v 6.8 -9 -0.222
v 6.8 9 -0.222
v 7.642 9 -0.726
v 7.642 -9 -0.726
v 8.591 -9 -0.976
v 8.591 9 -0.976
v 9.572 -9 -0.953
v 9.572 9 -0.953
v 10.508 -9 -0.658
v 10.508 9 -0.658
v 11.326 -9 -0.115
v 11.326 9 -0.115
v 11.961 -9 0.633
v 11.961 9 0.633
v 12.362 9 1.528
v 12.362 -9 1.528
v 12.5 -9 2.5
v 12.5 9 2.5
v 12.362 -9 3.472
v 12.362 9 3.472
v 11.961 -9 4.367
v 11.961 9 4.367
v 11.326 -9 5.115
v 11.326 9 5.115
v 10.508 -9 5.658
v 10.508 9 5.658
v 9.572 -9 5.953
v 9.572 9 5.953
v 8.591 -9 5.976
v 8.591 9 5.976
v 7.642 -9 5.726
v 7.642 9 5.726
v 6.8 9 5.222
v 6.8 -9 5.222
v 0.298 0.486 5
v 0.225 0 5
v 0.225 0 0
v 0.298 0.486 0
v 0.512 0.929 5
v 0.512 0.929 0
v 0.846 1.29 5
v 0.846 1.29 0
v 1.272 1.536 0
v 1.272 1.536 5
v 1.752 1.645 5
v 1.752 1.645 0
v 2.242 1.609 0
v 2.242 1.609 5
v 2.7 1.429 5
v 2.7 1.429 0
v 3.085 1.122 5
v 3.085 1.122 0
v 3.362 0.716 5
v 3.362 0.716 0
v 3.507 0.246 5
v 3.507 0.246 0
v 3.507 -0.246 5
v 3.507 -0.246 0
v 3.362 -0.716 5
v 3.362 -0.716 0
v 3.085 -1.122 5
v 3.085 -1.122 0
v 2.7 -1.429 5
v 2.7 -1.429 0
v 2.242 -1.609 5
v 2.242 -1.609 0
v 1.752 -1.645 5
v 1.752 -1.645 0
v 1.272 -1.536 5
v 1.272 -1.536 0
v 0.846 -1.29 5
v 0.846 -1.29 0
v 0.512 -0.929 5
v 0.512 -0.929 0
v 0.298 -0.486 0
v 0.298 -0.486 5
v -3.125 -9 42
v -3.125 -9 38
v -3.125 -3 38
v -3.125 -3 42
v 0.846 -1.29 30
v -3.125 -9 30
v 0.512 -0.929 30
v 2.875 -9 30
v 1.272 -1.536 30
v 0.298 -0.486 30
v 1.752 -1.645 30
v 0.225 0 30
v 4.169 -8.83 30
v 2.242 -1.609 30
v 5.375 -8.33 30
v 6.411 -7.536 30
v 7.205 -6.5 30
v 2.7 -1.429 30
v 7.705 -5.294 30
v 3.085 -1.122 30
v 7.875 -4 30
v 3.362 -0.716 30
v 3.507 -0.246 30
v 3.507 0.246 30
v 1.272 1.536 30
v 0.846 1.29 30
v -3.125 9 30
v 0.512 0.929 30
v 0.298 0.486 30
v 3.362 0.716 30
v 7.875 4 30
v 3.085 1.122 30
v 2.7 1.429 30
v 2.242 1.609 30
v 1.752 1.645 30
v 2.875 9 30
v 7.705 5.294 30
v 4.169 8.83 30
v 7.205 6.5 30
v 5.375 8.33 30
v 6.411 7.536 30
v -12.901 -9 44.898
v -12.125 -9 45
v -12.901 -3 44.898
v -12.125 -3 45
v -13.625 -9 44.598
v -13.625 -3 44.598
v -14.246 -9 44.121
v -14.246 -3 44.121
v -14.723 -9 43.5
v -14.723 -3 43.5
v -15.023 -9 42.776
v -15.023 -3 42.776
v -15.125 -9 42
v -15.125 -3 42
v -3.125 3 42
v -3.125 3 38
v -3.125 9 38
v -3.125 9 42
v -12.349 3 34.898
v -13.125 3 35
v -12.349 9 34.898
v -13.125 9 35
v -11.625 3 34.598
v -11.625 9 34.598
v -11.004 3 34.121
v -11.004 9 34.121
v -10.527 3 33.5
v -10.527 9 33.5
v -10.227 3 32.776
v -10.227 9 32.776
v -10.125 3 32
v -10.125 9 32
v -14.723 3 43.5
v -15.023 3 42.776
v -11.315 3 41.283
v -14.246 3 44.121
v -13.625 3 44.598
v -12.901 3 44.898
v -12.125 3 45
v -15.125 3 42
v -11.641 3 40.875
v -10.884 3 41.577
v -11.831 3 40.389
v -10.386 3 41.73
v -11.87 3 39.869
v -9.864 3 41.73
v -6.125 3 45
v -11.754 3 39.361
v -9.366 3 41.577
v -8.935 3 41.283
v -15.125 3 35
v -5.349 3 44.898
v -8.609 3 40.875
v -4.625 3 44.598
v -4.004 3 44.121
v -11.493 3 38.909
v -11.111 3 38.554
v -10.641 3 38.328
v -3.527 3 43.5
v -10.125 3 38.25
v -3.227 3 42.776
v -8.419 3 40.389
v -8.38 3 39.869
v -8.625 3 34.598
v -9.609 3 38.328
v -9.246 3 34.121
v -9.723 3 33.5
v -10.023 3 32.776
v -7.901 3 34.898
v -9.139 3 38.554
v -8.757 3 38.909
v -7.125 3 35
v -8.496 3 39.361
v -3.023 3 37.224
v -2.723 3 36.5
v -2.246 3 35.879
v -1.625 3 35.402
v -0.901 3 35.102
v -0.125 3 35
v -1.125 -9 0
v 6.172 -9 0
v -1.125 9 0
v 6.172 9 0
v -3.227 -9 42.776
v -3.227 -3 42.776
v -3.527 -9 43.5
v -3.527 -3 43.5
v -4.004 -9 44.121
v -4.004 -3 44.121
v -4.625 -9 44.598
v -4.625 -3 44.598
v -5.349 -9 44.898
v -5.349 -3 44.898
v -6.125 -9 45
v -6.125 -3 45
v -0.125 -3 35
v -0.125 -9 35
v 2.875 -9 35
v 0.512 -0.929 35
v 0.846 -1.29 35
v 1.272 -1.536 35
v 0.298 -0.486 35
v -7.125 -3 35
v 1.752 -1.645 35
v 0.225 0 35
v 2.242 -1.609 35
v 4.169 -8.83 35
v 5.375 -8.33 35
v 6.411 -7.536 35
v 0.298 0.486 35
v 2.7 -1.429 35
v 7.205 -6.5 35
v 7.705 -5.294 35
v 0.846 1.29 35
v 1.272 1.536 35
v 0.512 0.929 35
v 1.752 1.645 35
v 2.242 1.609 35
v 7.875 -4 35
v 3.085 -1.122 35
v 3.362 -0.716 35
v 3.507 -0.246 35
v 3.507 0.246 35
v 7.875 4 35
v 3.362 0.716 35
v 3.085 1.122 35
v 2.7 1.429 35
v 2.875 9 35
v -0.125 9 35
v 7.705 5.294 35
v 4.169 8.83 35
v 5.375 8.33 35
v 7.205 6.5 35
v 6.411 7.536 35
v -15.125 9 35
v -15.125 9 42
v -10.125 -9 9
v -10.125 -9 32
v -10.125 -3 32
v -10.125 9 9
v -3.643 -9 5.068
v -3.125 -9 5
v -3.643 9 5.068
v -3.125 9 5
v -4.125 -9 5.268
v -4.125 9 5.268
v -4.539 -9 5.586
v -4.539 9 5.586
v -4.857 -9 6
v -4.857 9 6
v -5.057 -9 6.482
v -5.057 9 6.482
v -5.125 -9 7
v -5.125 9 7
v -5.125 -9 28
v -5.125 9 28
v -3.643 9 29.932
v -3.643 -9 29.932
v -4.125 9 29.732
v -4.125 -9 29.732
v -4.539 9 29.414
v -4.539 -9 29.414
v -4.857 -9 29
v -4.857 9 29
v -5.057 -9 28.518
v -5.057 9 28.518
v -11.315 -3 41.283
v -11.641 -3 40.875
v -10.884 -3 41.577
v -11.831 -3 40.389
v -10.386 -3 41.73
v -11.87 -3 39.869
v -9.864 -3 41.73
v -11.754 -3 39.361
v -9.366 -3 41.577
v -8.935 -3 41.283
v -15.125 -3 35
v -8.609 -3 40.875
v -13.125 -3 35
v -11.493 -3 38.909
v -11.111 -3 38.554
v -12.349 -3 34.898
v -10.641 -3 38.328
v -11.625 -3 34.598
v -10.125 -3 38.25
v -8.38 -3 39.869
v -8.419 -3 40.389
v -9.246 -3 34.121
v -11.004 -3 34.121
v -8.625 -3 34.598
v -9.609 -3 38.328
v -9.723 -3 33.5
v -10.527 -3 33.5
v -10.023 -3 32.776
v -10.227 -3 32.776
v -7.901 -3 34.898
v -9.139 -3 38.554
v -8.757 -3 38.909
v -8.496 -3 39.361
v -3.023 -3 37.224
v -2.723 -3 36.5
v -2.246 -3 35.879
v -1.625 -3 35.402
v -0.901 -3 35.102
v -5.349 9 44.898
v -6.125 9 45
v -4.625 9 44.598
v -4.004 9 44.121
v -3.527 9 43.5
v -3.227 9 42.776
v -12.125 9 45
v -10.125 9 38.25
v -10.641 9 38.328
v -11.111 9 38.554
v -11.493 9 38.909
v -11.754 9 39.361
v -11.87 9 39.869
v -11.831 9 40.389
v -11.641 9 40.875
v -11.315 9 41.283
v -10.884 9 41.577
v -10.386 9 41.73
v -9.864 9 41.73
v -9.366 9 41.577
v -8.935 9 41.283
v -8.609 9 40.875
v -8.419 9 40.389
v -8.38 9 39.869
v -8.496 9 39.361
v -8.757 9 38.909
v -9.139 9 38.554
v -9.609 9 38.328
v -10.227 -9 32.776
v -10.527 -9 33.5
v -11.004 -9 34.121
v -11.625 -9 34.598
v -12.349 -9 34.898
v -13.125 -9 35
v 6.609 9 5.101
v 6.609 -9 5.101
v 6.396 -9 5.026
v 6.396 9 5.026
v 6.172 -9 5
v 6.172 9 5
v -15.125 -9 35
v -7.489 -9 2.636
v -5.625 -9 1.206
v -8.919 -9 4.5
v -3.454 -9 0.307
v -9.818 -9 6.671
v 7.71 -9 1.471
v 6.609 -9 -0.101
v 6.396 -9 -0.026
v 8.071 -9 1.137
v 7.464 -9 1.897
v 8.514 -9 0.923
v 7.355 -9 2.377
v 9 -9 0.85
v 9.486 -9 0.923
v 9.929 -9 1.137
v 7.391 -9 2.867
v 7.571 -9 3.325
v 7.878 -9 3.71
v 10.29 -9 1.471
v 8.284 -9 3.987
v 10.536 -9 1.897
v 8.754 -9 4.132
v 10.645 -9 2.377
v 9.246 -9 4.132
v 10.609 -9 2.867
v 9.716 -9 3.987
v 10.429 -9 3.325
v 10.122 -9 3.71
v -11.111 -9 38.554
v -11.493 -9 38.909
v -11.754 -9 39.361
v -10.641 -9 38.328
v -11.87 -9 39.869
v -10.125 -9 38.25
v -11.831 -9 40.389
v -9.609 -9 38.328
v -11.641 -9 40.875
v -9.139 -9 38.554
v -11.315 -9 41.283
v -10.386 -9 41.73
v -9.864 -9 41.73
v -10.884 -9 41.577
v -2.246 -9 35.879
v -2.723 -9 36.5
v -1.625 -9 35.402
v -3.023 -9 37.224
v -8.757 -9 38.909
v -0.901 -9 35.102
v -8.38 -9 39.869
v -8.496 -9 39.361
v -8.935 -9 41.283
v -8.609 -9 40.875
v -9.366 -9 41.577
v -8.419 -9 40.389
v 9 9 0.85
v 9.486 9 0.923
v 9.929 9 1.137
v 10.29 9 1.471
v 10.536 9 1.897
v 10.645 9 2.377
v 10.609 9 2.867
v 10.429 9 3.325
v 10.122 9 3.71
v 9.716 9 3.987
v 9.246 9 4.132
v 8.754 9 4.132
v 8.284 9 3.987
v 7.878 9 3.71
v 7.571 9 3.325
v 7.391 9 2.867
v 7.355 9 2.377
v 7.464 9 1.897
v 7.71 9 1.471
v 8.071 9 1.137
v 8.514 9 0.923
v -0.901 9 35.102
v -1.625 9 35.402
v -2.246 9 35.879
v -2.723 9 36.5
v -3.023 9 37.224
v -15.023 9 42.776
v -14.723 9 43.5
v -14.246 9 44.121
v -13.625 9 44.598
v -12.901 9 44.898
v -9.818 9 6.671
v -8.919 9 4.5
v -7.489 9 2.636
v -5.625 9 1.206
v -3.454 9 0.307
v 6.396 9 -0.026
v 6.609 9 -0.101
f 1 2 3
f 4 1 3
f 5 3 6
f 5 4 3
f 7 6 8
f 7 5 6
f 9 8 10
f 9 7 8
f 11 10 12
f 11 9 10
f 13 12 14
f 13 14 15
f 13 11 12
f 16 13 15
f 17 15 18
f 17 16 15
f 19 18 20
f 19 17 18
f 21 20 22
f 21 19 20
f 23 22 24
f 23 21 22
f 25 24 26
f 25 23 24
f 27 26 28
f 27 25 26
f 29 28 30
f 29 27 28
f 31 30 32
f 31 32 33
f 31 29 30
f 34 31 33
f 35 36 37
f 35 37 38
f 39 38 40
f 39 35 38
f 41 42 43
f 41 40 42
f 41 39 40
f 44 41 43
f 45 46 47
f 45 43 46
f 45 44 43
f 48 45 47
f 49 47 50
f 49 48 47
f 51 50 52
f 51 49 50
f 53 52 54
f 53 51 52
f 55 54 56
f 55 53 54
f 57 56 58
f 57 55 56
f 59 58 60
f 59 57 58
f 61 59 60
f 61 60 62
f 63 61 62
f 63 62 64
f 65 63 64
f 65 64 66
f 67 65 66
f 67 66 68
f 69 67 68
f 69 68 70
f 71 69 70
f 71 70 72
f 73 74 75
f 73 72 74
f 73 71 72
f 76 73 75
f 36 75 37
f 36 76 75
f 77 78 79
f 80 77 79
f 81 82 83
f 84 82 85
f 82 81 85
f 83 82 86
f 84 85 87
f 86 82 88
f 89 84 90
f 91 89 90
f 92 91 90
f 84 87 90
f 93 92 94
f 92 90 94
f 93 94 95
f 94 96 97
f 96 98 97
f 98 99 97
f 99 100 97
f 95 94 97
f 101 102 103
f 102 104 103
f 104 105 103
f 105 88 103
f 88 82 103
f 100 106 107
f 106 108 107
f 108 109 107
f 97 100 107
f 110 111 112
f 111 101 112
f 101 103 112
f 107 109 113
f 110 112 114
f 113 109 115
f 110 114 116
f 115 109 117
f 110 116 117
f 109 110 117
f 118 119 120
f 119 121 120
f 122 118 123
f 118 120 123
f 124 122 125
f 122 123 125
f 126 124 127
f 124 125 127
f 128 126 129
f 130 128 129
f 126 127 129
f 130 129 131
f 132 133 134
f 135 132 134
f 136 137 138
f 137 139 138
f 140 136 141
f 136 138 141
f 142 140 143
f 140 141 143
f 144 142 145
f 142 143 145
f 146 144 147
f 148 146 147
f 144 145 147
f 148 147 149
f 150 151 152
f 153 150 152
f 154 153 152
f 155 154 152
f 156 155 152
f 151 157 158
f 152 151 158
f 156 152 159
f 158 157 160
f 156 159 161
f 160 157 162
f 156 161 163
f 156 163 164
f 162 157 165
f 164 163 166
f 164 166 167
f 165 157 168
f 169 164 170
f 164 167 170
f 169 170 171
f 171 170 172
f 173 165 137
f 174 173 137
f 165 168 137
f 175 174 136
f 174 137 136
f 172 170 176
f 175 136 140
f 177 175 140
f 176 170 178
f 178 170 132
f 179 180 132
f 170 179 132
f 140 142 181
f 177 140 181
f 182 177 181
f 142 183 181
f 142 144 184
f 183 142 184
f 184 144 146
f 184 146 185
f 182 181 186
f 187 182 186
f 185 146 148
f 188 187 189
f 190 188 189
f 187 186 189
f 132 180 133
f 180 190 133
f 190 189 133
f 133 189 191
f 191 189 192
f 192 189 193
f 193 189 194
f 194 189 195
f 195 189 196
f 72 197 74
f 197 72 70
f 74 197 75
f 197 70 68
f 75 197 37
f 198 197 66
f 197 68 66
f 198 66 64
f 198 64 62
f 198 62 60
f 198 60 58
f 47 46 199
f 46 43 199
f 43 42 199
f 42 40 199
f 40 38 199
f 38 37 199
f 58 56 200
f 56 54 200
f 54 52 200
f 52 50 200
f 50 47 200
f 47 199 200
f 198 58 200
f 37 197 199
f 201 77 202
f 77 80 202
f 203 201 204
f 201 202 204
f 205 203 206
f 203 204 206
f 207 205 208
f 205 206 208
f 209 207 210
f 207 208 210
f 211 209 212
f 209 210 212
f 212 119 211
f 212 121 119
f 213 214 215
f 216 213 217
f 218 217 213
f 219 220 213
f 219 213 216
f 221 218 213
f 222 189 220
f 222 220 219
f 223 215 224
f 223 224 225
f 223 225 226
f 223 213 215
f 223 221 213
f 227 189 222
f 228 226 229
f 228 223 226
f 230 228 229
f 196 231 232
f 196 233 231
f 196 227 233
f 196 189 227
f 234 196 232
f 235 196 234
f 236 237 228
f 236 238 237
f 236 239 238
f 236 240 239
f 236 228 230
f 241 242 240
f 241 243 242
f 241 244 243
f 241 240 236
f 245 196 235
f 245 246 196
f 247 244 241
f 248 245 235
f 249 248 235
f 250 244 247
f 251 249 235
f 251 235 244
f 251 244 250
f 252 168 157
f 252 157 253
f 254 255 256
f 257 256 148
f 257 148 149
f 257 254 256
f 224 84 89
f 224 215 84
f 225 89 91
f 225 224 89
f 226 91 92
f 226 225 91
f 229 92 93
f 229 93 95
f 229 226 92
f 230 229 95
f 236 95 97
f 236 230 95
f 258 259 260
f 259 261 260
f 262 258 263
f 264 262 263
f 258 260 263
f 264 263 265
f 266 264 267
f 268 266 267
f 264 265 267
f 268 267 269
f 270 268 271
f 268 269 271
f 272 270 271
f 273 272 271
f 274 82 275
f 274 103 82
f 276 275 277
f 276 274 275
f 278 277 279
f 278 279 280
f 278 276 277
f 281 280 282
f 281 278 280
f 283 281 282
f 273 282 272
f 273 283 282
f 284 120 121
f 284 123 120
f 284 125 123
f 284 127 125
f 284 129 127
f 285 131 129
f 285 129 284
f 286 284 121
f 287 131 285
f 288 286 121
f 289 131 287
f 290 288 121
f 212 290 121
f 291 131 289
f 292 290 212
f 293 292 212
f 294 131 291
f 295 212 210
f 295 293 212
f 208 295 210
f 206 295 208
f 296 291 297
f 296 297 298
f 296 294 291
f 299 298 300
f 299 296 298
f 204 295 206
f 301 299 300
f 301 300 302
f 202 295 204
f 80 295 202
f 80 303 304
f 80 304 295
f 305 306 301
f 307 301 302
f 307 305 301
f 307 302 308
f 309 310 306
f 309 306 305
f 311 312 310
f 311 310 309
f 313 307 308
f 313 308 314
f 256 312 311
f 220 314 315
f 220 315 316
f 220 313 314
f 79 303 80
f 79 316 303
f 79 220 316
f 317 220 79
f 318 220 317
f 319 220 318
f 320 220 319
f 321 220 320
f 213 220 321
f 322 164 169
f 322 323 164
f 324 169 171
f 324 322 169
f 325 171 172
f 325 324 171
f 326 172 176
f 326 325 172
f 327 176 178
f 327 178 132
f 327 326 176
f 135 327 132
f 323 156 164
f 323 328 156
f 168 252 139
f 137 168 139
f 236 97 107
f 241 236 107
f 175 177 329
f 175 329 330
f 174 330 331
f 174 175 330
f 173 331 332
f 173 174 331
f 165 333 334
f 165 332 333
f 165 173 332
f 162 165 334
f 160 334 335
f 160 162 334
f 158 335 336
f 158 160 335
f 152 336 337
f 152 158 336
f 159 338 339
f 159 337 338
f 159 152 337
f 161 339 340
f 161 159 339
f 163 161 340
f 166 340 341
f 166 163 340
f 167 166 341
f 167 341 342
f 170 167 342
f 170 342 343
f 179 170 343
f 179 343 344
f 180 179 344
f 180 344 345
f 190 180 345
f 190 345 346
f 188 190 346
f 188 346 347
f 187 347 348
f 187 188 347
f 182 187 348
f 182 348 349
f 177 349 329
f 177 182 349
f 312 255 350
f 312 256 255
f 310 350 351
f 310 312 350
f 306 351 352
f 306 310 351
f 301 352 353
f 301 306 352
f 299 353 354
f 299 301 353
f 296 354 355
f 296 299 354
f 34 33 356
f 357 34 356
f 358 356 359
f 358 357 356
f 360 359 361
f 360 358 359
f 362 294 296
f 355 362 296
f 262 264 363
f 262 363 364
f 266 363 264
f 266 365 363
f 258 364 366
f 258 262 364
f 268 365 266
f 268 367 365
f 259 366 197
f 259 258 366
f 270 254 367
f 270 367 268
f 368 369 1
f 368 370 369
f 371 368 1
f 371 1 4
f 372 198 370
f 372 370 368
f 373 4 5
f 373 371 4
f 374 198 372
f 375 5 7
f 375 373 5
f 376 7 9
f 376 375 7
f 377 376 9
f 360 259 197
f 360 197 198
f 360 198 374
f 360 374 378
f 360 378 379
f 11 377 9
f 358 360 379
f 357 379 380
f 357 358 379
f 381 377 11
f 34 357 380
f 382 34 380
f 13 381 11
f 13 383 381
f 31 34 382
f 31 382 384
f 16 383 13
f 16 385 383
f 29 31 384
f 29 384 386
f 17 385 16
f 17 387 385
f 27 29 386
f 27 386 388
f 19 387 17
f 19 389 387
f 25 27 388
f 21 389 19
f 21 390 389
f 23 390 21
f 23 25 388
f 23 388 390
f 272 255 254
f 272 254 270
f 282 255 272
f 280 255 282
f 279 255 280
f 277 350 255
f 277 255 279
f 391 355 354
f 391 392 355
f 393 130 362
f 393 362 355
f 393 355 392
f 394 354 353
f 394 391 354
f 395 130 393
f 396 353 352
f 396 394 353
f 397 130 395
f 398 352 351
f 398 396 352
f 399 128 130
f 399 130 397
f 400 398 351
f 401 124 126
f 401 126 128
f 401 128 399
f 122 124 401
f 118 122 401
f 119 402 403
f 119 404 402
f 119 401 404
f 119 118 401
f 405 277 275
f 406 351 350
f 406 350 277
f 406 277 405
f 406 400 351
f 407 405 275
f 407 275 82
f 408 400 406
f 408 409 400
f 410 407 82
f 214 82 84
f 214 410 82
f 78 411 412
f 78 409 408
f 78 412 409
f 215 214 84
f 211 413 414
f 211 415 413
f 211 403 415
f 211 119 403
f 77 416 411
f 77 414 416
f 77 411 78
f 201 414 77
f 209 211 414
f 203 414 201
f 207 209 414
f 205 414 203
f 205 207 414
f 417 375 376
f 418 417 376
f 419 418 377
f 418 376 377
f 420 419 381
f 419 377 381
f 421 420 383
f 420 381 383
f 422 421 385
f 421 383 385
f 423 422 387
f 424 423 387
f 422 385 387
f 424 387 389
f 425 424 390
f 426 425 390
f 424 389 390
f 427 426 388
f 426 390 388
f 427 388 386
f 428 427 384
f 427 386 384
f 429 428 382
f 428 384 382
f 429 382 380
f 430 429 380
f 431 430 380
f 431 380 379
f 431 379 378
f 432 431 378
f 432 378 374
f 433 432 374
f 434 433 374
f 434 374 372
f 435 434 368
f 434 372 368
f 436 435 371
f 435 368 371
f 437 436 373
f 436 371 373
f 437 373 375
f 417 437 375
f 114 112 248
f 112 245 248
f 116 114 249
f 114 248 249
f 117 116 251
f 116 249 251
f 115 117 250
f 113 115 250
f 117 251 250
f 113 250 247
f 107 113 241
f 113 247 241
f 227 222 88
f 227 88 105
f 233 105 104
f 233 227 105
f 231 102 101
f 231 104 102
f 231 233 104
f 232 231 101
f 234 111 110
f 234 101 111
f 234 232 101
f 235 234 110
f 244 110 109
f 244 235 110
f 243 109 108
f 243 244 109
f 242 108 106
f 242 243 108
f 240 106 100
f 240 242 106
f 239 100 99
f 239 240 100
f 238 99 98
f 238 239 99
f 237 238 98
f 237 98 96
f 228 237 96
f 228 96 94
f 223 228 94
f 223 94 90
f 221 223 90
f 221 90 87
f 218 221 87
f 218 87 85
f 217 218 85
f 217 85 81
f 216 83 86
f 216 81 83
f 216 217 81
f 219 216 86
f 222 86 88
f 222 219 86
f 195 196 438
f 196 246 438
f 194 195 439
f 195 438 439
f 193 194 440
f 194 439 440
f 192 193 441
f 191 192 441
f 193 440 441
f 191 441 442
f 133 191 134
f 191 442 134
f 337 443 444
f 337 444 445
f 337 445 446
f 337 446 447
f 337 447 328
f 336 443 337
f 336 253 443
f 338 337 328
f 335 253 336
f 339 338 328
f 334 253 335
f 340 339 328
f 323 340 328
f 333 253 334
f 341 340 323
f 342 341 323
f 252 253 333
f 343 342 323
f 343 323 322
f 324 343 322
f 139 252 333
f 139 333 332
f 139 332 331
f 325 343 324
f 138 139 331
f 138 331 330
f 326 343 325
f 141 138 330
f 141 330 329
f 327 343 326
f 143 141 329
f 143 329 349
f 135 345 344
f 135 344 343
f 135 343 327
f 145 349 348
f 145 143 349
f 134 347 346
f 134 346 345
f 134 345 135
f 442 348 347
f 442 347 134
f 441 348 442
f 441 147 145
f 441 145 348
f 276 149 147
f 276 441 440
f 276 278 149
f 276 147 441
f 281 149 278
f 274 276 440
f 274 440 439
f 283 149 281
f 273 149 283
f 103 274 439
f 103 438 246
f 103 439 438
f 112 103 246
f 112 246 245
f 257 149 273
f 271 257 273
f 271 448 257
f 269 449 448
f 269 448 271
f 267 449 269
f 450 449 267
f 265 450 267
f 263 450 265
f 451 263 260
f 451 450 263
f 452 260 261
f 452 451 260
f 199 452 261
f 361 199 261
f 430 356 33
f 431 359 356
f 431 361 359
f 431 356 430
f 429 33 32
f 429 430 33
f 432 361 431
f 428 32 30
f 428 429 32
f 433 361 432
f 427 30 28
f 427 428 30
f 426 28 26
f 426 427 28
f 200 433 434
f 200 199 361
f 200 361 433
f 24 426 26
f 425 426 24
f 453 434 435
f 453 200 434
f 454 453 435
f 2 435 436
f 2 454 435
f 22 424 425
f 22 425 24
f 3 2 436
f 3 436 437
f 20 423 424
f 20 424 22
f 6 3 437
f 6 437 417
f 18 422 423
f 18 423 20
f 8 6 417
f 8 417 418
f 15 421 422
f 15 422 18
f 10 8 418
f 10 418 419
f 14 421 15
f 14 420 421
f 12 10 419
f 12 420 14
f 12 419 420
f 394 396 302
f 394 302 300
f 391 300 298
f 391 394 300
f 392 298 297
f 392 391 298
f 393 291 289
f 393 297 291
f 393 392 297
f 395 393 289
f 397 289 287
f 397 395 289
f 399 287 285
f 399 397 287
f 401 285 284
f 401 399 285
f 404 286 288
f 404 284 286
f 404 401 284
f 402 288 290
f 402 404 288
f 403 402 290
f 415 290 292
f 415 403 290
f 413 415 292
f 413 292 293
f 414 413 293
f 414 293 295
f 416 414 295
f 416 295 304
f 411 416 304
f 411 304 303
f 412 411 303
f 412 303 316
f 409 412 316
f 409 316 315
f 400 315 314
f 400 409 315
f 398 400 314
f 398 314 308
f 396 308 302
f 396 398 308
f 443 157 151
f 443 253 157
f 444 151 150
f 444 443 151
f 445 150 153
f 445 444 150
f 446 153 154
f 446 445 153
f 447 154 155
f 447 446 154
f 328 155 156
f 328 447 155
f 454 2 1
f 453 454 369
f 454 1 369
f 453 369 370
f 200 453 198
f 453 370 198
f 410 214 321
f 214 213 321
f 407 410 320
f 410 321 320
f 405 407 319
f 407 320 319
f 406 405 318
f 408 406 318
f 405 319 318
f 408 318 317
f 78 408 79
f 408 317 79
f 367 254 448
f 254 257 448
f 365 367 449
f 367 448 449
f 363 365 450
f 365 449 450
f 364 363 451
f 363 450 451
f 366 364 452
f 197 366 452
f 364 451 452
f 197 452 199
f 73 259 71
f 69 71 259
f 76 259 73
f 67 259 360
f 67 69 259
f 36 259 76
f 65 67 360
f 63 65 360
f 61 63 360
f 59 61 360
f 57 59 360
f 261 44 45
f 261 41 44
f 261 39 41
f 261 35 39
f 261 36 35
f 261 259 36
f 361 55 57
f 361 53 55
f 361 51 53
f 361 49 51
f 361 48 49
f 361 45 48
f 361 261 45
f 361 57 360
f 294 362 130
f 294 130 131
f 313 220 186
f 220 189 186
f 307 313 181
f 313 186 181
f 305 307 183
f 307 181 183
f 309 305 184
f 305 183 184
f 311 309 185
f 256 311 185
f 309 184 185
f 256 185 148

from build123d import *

# Parameters (mm, degrees)
SKETCH1_W               = 20.25
SKETCH1_H               = 18
BOSS_EXTRUDE1_DEPTH     = 5
SKETCH2_W               = 5
SKETCH2_H               = 18
BOSS_EXTRUDE2_DEPTH     = 25
SKETCH3_W               = 18
SKETCH3_H               = 18
BOSS_EXTRUDE3_DEPTH     = 5
CUT_EXTRUDE2_DEPTH      = 33.916798523
CUT_EXTRUDE2_DEPTH_BACK = 33.916798523
SKETCH5_R               = 1.65
FILLET1_R               = 9
FILLET7_R               = 5
CUT_EXTRUDE4_DEPTH      = 41.638843795
CUT_EXTRUDE4_DEPTH_BACK = 41.638843795
SKETCH10_R              = 1.65
SKETCH10_4_R            = 3.5
SKETCH10_4_R_2          = 1.65
BOSS_EXTRUDE7_DEPTH     = 18
FILLET13_R              = 1
FILLET16_R              = 2
SKETCH11_W              = 12
SKETCH11_H              = 6
BOSS_EXTRUDE8_DEPTH     = 10
CUT_EXTRUDE5_DEPTH      = 51.771701025
CUT_EXTRUDE5_DEPTH_BACK = 51.771701025
SKETCH12_R              = 1.75
FILLET17_R              = 3
FILLET19_R              = 3
FILLET20_R              = 2


with BuildPart() as part:
    # Sketch1 → Boss-Extrude1 (new body)
    with BuildSketch(Plane.XY):
        Rectangle(SKETCH1_W, SKETCH1_H)
    extrude(amount=BOSS_EXTRUDE1_DEPTH)

    # Sketch2 → Boss-Extrude2 (add)
    with BuildSketch(Plane.XY.offset(5)):
        with Locations((-7.625, 0)):
            Rectangle(SKETCH2_W, SKETCH2_H)
    extrude(amount=BOSS_EXTRUDE2_DEPTH)

    # Sketch3 → Boss-Extrude3 (add)
    with BuildSketch(Plane.XY.offset(30)):
        with Locations((-1.125, 0)):
            Rectangle(SKETCH3_W, SKETCH3_H)
    extrude(amount=BOSS_EXTRUDE3_DEPTH)

    # Sketch5 → Cut-Extrude2 (cut, two sides: drawn at the far end of the back side and taken through both)
    with BuildSketch(Plane(origin=(0, 0, 30), x_dir=(-1, 0, 0), z_dir=(0, 0, -1)).offset(-CUT_EXTRUDE2_DEPTH_BACK)):
        with Locations((-1.875, 0)):
            Circle(SKETCH5_R)
    extrude(amount=CUT_EXTRUDE2_DEPTH + CUT_EXTRUDE2_DEPTH_BACK, mode=Mode.SUBTRACT)

    # Fillet1
    fillet1_edges = [part.edges().sort_by_distance(p)[0] for p in [
        (-10.125, 0, 0),
    ]]
    fillet(fillet1_edges, radius=FILLET1_R)

    # Fillet7
    fillet7_edges = [part.edges().sort_by_distance(p)[0] for p in [
        (7.875, -9, 32.5),
        (7.875, 9, 32.5),
    ]]
    fillet(fillet7_edges, radius=FILLET7_R)

    # Sketch10 → Cut-Extrude4 (cut, two sides: drawn at the far end of the back side and taken through both)
    with BuildSketch(Plane.XZ.offset(9).offset(-CUT_EXTRUDE4_DEPTH_BACK)):
        with Locations((9, 2.5)):
            Circle(SKETCH10_R)
    extrude(amount=CUT_EXTRUDE4_DEPTH + CUT_EXTRUDE4_DEPTH_BACK, mode=Mode.SUBTRACT)

    # Sketch10<4> → Boss-Extrude7 (add)
    with BuildSketch(Plane.XZ.offset(9)):
        with Locations((9, 2.5)):
            Circle(SKETCH10_4_R)
        with Locations((9, 2.5)):
            Circle(SKETCH10_4_R_2, mode=Mode.SUBTRACT)
    extrude(amount=-BOSS_EXTRUDE7_DEPTH)

    # Fillet13
    fillet13_edges = [part.edges().sort_by_distance(p)[0] for p in [
        (6.550510257, 0, 0),
        (6.550510257, 0, 5),
    ]]
    fillet(fillet13_edges, radius=FILLET13_R)

    # Fillet16
    fillet16_edges = [part.edges().sort_by_distance(p)[0] for p in [
        (-5.125, 0, 5),
    ]]
    fillet(fillet16_edges, radius=FILLET16_R)

    # Sketch11 → Boss-Extrude8 (add)
    with BuildSketch(Plane.XY.offset(35)):
        with Locations((-9.125, 6)):
            Rectangle(SKETCH11_W, SKETCH11_H)
        with Locations((-9.125, -6)):
            Rectangle(SKETCH11_W, SKETCH11_H)
    extrude(amount=BOSS_EXTRUDE8_DEPTH)

    # Sketch12 → Cut-Extrude5 (cut, two sides: drawn at the far end of the back side and taken through both)
    with BuildSketch(Plane(origin=(0, 9, 0), x_dir=(1, 0, 0), z_dir=(0, 1, 0)).offset(-CUT_EXTRUDE5_DEPTH_BACK)):
        with Locations((-10.125, -40)):
            Circle(SKETCH12_R)
    extrude(amount=CUT_EXTRUDE5_DEPTH + CUT_EXTRUDE5_DEPTH_BACK, mode=Mode.SUBTRACT)

    # Fillet17
    fillet17_edges = [part.edges().sort_by_distance(p)[0] for p in [
        (-3.125, 6, 35),
        (-3.125, 6, 45),
        (-15.125, 6, 45),
        (-10.125, 6, 35),
        (-3.125, -6, 35),
        (-3.125, -6, 45),
        (-15.125, -6, 45),
        (-10.125, -6, 35),
    ]]
    fillet(fillet17_edges, radius=FILLET17_R)

    # Fillet19
    fillet19_edges = [part.edges().sort_by_distance(p)[0] for p in [
        (-10.125, 0, 35),
    ]]
    fillet(fillet19_edges, radius=FILLET19_R)

    # Fillet20
    fillet20_edges = [part.edges().sort_by_distance(p)[0] for p in [
        (-5.125, 0, 30),
    ]]
    fillet(fillet20_edges, radius=FILLET20_R)


solid = part.part
